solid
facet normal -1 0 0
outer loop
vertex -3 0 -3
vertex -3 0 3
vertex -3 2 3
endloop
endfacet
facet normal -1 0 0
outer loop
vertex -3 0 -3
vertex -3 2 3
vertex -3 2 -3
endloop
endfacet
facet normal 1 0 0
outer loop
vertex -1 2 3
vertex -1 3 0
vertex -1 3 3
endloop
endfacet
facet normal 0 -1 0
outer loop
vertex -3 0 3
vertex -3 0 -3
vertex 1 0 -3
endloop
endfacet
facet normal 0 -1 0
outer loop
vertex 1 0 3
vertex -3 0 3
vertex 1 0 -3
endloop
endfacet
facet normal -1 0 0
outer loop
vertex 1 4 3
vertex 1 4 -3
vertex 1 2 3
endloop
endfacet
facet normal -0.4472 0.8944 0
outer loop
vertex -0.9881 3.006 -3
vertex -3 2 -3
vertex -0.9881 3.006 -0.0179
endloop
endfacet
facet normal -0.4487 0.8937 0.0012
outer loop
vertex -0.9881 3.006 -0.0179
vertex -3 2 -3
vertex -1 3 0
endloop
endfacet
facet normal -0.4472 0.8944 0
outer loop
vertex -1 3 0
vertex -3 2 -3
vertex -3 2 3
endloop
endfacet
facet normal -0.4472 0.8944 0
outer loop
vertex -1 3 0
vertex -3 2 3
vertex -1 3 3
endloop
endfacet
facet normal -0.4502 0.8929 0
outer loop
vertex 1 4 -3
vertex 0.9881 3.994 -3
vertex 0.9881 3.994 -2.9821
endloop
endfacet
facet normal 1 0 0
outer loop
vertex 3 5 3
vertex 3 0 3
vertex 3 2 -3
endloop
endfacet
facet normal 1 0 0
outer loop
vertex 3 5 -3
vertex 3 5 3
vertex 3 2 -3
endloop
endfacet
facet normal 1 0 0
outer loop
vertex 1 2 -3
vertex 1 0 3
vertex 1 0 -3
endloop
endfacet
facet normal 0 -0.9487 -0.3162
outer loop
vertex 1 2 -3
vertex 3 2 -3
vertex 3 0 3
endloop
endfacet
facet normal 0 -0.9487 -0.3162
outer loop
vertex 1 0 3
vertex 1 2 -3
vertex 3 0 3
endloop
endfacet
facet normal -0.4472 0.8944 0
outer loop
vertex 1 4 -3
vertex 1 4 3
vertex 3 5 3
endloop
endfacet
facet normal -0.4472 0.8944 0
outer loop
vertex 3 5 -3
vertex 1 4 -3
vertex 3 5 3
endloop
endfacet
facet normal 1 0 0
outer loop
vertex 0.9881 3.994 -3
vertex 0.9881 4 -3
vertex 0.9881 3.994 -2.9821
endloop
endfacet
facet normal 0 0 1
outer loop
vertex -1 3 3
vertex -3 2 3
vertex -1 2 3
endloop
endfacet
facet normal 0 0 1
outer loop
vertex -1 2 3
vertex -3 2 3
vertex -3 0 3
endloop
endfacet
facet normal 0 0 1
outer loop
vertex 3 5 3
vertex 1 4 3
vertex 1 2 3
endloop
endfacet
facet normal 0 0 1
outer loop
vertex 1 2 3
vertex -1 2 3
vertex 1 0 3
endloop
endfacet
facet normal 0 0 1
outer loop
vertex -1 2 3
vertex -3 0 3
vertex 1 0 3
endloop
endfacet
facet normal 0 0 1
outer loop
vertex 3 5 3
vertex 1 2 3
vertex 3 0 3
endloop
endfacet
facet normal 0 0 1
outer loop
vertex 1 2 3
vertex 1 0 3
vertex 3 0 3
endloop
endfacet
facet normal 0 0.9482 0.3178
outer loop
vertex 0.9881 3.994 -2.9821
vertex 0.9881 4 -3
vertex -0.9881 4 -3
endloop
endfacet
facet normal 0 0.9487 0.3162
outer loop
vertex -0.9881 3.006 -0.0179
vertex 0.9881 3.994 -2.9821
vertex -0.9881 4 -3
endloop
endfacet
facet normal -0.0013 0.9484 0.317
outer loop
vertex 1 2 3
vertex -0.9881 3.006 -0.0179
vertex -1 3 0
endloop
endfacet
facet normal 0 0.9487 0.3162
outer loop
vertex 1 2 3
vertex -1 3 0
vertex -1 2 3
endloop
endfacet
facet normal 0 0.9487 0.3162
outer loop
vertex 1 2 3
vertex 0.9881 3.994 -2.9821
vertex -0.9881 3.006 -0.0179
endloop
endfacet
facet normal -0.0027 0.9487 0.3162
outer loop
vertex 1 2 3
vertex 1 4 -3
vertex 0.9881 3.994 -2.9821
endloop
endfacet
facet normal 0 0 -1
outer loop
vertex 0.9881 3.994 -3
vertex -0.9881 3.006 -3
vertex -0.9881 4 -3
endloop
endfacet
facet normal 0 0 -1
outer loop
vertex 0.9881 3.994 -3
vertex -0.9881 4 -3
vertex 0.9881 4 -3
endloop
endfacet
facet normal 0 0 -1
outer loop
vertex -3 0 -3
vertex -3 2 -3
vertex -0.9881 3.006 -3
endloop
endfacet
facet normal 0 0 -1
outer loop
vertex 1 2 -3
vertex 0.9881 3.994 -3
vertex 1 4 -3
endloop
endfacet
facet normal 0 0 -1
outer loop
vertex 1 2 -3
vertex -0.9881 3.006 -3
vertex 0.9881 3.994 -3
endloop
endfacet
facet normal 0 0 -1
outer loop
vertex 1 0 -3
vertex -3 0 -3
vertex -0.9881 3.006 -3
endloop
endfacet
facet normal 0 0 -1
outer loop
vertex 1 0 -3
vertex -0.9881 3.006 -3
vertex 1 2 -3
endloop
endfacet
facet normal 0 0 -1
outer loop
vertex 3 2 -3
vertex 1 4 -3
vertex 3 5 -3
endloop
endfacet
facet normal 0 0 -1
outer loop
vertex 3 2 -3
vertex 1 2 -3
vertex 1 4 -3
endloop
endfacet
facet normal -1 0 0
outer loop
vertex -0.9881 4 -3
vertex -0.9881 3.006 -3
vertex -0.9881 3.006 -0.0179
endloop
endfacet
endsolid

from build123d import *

# Parameters (mm, degrees)
SKETCH1_W           = 6
SKETCH1_H           = 6
BOSS_EXTRUDE1_DEPTH = 5
CUT_EXTRUDE12_DEPTH = 12
CUT_EXTRUDE13_DEPTH = 1
CUT_EXTRUDE14_DEPTH = 2


with BuildPart() as part:
    # Sketch1 → Boss-Extrude1 (new body)
    with BuildSketch(Plane(origin=(0, 0, 0), x_dir=(1, 0, 0), z_dir=(0, 1, 0))):
        Rectangle(SKETCH1_W, SKETCH1_H)
    extrude(amount=BOSS_EXTRUDE1_DEPTH)

    # Sketch11 → Cut-Extrude12 (cut)
    with BuildSketch(Plane.XY.offset(3)):
        Polygon((-3, 5), (-3, 2), (-0.98808733, 3.005956335), (-0.98808733, 4), (0.98808733, 4), (0.98808733, 3.994043665), (3, 5), align=None)
    extrude(amount=-CUT_EXTRUDE12_DEPTH, mode=Mode.SUBTRACT)

    # Sketch12 → Cut-Extrude13 (cut, symmetric)
    with BuildSketch(Plane(origin=(0, 0, 0), x_dir=(0, 0, -1), z_dir=(1, 0, 0))):
        Polygon((3, 4), (-3, 2), (-3, 3.005956335), (-3, 4), align=None)
    extrude(amount=CUT_EXTRUDE13_DEPTH, both=True, mode=Mode.SUBTRACT)

    # Sketch13 → Cut-Extrude14 (cut)
    with BuildSketch(Plane(origin=(3, 0, 0), x_dir=(0, 0, -1), z_dir=(1, 0, 0))):
        Polygon((3, 2), (-3, 0), (3, 0), align=None)
    extrude(amount=-CUT_EXTRUDE14_DEPTH, mode=Mode.SUBTRACT)


solid = part.part
